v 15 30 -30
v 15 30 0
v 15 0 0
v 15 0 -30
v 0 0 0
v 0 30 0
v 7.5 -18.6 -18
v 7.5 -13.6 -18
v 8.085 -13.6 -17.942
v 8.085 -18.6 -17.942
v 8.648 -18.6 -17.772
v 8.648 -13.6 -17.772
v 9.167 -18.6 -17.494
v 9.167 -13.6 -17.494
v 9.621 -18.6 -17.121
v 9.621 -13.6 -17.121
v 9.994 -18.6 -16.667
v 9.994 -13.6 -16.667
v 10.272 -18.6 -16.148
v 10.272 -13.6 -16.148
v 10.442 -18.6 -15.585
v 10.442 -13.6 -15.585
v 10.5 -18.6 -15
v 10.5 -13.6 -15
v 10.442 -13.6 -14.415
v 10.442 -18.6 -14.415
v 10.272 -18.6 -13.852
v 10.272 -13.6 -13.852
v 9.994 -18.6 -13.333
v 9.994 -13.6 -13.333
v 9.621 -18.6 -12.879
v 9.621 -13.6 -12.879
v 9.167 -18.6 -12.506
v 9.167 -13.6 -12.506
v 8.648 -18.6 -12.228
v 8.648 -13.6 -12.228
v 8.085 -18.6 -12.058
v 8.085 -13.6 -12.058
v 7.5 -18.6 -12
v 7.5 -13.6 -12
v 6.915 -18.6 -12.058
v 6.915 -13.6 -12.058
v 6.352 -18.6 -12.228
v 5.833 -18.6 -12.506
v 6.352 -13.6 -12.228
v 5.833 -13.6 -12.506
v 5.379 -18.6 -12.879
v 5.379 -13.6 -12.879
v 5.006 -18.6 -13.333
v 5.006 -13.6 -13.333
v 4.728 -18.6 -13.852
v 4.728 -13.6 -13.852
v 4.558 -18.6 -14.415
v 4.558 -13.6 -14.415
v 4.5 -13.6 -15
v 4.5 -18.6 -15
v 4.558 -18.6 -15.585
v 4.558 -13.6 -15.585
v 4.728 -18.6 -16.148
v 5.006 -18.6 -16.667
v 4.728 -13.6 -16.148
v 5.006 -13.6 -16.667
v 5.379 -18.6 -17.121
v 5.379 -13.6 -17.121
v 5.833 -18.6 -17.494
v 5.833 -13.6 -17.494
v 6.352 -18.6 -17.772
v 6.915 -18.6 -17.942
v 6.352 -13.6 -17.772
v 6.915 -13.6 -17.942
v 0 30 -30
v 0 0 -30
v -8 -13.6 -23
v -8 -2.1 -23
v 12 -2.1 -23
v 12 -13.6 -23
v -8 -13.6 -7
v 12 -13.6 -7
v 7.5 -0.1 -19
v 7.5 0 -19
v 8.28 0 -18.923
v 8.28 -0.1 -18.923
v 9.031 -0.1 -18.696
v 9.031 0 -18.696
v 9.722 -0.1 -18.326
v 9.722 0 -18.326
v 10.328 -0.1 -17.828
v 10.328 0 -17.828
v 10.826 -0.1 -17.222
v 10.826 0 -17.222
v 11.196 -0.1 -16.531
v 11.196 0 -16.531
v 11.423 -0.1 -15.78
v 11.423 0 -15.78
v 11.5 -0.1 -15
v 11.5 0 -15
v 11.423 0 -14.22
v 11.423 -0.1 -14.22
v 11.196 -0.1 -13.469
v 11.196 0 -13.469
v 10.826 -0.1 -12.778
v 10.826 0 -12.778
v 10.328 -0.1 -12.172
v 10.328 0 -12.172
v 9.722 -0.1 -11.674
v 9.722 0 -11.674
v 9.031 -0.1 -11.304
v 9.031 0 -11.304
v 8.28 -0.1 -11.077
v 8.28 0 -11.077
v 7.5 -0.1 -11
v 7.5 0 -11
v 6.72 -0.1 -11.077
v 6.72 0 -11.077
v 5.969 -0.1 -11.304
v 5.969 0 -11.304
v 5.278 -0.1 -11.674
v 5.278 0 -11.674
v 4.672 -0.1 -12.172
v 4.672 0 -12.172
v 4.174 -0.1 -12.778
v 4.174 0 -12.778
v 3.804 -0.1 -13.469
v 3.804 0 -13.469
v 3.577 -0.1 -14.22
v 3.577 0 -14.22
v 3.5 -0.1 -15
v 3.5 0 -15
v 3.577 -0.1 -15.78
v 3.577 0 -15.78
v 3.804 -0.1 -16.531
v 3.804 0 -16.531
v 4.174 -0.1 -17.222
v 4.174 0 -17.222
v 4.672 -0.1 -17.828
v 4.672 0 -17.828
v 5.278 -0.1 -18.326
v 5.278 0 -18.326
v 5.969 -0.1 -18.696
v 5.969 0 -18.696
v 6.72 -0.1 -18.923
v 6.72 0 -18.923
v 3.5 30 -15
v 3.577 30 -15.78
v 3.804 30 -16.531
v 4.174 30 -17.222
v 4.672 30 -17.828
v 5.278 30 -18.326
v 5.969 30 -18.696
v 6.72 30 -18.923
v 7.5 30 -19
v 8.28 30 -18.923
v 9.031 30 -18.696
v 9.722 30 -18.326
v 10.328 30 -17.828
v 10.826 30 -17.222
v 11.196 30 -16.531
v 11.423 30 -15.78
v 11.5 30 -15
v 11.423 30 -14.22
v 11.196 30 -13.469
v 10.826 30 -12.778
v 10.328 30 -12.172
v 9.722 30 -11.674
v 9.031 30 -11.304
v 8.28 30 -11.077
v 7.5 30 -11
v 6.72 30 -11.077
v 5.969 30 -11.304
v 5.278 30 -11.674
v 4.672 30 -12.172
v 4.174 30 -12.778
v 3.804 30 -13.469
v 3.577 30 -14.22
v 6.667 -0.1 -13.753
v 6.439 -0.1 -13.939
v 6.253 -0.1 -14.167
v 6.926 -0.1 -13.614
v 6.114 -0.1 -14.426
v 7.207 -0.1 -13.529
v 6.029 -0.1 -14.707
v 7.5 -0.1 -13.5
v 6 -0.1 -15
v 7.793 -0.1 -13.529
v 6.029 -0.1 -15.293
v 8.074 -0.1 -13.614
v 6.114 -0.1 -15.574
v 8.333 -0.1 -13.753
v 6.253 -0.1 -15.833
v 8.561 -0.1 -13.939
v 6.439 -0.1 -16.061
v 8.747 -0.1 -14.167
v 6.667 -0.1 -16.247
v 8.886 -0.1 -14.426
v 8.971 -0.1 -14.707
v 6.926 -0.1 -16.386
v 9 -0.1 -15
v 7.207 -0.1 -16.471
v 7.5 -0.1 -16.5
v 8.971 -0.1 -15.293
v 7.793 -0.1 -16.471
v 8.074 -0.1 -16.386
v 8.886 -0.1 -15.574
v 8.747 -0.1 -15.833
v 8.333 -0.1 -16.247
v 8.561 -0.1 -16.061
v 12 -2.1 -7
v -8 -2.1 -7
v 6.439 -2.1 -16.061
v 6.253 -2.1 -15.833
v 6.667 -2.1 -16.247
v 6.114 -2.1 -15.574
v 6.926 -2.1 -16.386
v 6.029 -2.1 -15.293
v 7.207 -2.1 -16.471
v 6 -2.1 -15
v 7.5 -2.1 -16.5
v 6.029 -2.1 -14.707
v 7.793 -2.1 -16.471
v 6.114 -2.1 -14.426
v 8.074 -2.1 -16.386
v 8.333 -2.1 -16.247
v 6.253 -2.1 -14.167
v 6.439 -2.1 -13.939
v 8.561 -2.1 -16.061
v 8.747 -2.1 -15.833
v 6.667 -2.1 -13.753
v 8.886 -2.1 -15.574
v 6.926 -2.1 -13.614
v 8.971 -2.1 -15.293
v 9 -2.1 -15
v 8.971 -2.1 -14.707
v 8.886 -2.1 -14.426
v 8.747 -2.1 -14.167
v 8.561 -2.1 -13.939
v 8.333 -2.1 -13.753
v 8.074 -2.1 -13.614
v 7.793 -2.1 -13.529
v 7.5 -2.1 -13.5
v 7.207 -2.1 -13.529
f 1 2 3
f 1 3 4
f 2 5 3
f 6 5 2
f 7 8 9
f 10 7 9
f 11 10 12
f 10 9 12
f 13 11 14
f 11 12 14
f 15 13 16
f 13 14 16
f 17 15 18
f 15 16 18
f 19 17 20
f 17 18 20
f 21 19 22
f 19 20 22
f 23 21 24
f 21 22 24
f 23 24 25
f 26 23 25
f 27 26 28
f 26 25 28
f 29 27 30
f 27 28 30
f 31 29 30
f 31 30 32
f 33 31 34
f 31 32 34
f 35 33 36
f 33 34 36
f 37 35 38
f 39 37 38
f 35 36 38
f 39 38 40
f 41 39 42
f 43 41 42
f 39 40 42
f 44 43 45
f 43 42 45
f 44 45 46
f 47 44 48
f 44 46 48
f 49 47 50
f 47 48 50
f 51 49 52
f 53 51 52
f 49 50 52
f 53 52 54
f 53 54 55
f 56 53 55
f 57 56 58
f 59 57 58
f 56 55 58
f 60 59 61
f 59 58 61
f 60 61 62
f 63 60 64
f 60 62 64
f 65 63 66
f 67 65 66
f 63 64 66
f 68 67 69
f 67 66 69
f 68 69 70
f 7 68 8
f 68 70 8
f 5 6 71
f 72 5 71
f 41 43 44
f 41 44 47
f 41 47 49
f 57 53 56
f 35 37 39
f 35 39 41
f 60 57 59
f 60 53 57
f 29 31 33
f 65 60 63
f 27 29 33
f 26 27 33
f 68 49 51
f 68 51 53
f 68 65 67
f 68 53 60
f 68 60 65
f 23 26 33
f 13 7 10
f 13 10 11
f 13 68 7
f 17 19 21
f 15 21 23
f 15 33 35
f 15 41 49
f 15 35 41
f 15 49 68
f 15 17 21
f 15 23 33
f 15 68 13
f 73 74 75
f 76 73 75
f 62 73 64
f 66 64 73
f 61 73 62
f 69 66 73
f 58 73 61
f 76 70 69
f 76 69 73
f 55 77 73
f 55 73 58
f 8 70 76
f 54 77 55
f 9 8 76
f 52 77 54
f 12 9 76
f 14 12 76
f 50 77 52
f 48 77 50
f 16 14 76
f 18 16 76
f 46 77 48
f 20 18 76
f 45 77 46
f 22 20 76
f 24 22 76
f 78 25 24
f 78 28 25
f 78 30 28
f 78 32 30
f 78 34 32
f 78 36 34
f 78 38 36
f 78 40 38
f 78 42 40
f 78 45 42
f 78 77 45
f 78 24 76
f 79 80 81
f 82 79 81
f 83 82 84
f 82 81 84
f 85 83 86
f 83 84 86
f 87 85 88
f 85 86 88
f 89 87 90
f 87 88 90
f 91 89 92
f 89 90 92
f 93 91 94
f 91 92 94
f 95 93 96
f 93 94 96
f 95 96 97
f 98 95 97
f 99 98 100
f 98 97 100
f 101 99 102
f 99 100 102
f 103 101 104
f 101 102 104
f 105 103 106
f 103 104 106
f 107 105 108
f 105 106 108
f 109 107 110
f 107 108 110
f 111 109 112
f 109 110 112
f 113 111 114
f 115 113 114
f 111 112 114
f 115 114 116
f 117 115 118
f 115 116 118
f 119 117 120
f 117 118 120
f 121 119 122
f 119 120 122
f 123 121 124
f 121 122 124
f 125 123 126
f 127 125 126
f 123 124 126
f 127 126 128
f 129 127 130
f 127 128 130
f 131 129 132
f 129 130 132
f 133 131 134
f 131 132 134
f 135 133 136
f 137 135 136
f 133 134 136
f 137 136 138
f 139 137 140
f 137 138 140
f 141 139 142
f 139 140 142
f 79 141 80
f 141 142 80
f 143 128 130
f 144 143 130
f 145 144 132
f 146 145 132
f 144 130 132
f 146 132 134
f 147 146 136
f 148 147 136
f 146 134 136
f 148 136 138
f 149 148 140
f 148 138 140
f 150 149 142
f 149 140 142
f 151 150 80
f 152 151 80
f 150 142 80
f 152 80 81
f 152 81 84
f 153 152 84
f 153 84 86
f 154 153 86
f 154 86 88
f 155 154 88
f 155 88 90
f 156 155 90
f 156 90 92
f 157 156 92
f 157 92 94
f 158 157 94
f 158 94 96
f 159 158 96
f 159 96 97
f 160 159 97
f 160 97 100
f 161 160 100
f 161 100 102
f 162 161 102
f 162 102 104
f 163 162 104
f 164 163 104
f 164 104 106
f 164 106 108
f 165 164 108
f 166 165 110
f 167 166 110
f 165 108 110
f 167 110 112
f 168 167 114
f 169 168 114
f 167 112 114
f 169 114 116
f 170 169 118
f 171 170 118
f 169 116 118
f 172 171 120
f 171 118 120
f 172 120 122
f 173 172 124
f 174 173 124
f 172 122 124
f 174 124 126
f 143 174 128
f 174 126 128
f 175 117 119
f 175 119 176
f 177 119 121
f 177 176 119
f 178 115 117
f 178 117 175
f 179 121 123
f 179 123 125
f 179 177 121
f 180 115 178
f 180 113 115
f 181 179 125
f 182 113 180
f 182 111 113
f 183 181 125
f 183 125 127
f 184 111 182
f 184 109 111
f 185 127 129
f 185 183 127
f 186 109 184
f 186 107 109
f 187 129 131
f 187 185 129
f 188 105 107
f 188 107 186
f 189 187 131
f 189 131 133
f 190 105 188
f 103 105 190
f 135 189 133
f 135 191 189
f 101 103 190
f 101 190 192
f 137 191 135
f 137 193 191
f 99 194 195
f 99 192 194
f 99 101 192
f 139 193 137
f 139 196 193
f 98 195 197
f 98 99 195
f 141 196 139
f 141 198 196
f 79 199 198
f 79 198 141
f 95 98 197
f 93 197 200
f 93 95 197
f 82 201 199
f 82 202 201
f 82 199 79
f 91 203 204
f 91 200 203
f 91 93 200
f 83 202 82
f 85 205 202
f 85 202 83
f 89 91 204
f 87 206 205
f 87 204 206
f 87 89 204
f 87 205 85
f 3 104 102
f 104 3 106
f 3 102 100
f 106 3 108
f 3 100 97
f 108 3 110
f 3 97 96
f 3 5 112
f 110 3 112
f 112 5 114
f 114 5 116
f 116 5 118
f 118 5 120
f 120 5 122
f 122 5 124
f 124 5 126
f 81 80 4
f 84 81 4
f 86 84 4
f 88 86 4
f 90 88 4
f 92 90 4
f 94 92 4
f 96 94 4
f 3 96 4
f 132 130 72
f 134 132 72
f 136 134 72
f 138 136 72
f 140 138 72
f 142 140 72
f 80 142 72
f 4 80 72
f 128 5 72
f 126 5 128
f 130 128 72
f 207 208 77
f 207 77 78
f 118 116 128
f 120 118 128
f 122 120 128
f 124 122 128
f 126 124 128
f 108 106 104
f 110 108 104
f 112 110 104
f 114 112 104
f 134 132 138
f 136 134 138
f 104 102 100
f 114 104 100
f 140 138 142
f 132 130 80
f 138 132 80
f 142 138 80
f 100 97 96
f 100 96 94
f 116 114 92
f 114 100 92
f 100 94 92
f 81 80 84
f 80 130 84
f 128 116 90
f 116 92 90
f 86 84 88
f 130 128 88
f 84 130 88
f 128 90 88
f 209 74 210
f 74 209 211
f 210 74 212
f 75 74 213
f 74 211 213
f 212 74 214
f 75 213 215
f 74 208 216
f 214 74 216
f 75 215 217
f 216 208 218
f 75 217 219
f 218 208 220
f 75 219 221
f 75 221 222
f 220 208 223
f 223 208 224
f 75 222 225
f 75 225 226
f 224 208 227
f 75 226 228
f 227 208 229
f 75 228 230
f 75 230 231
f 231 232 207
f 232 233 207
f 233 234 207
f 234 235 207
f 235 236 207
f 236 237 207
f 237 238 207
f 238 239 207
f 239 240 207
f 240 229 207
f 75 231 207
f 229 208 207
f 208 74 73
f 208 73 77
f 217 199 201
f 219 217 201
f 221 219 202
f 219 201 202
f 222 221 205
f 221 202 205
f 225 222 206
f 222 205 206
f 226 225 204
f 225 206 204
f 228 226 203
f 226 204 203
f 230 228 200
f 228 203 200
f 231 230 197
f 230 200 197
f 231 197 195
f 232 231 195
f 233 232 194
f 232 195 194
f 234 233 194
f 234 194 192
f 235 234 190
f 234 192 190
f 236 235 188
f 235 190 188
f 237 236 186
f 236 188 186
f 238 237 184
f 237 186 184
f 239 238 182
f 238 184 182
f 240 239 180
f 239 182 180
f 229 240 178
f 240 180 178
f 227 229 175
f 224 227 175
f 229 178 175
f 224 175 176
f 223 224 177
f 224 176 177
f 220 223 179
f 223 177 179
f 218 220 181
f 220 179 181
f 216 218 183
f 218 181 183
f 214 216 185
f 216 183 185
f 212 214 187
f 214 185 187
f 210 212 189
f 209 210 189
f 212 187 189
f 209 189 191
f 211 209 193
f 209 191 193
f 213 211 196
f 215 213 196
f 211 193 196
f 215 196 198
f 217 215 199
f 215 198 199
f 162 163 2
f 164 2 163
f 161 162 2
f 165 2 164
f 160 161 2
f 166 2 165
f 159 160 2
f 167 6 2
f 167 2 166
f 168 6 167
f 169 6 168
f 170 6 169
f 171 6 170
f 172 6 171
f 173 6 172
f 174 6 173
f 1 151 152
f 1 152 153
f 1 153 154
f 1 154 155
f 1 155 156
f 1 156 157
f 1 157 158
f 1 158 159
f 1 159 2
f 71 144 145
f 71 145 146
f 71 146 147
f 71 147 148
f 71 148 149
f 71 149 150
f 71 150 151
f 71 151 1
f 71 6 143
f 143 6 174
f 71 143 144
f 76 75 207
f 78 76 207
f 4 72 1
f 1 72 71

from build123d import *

# Parameters (mm, degrees)
SKETCH_1_W            = 30
SKETCH_1_H            = 30
EXTRUDE_1_DEPTH       = 15
HOLE_WIZARD_8_0_8_1_D = 8
SKETCH_4_R            = 4
EXTRUDE_2_DEPTH       = 0.1
SKETCH_5_R            = 1.5
EXTRUDE_3_DEPTH       = 2
SKETCH_6_W            = 20
SKETCH_6_H            = 16
EXTRUDE_4_DEPTH       = 11.5
SKETCH_7_R            = 3
EXTRUDE_5_DEPTH       = 5


with BuildPart() as part:
    # Эскиз1 → Бобышка-Вытянуть1 (new body)
    with BuildSketch(Plane(origin=(0, 0, 0), x_dir=(0, 0, -1), z_dir=(1, 0, 0))):
        with Locations((15, 15)):
            Rectangle(SKETCH_1_W, SKETCH_1_H)
    extrude(amount=EXTRUDE_1_DEPTH)

    # Диаметр отверстия Ø8.0 (8)1 (through all)
    with Locations(Plane(origin=(0, 30, 0), x_dir=(1, 0, 0), z_dir=(0, 1, 0))):
        with Locations((7.5, 15)):
            Hole(HOLE_WIZARD_8_0_8_1_D / 2)


with BuildPart() as body_2:
    # Эскиз4 → Бобышка-Вытянуть2 (new body)
    with BuildSketch(Plane.XZ):
        with Locations(Location((7.5, -15, 0), (0, 0, 270))):
            Circle(SKETCH_4_R)
    extrude(amount=EXTRUDE_2_DEPTH)

    # Эскиз5 → Бобышка-Вытянуть3 (add)
    with BuildSketch(Plane.XZ.offset(0.1)):
        with Locations(Location((7.5, -15, 0), (0, 0, 270))):
            Circle(SKETCH_5_R)
    extrude(amount=EXTRUDE_3_DEPTH)

    # Эскиз6 → Бобышка-Вытянуть4 (add)
    with BuildSketch(Plane.XZ.offset(2.1)):
        with Locations((2, -15)):
            Rectangle(SKETCH_6_W, SKETCH_6_H)
    extrude(amount=EXTRUDE_4_DEPTH)

    # Эскиз7 → Бобышка-Вытянуть5 (add)
    with BuildSketch(Plane.XZ.offset(13.6)):
        with Locations(Location((7.5, -15, 0), (0, 0, 270))):
            Circle(SKETCH_7_R)
    extrude(amount=EXTRUDE_5_DEPTH)


solid = Compound([part.part, body_2.part])
